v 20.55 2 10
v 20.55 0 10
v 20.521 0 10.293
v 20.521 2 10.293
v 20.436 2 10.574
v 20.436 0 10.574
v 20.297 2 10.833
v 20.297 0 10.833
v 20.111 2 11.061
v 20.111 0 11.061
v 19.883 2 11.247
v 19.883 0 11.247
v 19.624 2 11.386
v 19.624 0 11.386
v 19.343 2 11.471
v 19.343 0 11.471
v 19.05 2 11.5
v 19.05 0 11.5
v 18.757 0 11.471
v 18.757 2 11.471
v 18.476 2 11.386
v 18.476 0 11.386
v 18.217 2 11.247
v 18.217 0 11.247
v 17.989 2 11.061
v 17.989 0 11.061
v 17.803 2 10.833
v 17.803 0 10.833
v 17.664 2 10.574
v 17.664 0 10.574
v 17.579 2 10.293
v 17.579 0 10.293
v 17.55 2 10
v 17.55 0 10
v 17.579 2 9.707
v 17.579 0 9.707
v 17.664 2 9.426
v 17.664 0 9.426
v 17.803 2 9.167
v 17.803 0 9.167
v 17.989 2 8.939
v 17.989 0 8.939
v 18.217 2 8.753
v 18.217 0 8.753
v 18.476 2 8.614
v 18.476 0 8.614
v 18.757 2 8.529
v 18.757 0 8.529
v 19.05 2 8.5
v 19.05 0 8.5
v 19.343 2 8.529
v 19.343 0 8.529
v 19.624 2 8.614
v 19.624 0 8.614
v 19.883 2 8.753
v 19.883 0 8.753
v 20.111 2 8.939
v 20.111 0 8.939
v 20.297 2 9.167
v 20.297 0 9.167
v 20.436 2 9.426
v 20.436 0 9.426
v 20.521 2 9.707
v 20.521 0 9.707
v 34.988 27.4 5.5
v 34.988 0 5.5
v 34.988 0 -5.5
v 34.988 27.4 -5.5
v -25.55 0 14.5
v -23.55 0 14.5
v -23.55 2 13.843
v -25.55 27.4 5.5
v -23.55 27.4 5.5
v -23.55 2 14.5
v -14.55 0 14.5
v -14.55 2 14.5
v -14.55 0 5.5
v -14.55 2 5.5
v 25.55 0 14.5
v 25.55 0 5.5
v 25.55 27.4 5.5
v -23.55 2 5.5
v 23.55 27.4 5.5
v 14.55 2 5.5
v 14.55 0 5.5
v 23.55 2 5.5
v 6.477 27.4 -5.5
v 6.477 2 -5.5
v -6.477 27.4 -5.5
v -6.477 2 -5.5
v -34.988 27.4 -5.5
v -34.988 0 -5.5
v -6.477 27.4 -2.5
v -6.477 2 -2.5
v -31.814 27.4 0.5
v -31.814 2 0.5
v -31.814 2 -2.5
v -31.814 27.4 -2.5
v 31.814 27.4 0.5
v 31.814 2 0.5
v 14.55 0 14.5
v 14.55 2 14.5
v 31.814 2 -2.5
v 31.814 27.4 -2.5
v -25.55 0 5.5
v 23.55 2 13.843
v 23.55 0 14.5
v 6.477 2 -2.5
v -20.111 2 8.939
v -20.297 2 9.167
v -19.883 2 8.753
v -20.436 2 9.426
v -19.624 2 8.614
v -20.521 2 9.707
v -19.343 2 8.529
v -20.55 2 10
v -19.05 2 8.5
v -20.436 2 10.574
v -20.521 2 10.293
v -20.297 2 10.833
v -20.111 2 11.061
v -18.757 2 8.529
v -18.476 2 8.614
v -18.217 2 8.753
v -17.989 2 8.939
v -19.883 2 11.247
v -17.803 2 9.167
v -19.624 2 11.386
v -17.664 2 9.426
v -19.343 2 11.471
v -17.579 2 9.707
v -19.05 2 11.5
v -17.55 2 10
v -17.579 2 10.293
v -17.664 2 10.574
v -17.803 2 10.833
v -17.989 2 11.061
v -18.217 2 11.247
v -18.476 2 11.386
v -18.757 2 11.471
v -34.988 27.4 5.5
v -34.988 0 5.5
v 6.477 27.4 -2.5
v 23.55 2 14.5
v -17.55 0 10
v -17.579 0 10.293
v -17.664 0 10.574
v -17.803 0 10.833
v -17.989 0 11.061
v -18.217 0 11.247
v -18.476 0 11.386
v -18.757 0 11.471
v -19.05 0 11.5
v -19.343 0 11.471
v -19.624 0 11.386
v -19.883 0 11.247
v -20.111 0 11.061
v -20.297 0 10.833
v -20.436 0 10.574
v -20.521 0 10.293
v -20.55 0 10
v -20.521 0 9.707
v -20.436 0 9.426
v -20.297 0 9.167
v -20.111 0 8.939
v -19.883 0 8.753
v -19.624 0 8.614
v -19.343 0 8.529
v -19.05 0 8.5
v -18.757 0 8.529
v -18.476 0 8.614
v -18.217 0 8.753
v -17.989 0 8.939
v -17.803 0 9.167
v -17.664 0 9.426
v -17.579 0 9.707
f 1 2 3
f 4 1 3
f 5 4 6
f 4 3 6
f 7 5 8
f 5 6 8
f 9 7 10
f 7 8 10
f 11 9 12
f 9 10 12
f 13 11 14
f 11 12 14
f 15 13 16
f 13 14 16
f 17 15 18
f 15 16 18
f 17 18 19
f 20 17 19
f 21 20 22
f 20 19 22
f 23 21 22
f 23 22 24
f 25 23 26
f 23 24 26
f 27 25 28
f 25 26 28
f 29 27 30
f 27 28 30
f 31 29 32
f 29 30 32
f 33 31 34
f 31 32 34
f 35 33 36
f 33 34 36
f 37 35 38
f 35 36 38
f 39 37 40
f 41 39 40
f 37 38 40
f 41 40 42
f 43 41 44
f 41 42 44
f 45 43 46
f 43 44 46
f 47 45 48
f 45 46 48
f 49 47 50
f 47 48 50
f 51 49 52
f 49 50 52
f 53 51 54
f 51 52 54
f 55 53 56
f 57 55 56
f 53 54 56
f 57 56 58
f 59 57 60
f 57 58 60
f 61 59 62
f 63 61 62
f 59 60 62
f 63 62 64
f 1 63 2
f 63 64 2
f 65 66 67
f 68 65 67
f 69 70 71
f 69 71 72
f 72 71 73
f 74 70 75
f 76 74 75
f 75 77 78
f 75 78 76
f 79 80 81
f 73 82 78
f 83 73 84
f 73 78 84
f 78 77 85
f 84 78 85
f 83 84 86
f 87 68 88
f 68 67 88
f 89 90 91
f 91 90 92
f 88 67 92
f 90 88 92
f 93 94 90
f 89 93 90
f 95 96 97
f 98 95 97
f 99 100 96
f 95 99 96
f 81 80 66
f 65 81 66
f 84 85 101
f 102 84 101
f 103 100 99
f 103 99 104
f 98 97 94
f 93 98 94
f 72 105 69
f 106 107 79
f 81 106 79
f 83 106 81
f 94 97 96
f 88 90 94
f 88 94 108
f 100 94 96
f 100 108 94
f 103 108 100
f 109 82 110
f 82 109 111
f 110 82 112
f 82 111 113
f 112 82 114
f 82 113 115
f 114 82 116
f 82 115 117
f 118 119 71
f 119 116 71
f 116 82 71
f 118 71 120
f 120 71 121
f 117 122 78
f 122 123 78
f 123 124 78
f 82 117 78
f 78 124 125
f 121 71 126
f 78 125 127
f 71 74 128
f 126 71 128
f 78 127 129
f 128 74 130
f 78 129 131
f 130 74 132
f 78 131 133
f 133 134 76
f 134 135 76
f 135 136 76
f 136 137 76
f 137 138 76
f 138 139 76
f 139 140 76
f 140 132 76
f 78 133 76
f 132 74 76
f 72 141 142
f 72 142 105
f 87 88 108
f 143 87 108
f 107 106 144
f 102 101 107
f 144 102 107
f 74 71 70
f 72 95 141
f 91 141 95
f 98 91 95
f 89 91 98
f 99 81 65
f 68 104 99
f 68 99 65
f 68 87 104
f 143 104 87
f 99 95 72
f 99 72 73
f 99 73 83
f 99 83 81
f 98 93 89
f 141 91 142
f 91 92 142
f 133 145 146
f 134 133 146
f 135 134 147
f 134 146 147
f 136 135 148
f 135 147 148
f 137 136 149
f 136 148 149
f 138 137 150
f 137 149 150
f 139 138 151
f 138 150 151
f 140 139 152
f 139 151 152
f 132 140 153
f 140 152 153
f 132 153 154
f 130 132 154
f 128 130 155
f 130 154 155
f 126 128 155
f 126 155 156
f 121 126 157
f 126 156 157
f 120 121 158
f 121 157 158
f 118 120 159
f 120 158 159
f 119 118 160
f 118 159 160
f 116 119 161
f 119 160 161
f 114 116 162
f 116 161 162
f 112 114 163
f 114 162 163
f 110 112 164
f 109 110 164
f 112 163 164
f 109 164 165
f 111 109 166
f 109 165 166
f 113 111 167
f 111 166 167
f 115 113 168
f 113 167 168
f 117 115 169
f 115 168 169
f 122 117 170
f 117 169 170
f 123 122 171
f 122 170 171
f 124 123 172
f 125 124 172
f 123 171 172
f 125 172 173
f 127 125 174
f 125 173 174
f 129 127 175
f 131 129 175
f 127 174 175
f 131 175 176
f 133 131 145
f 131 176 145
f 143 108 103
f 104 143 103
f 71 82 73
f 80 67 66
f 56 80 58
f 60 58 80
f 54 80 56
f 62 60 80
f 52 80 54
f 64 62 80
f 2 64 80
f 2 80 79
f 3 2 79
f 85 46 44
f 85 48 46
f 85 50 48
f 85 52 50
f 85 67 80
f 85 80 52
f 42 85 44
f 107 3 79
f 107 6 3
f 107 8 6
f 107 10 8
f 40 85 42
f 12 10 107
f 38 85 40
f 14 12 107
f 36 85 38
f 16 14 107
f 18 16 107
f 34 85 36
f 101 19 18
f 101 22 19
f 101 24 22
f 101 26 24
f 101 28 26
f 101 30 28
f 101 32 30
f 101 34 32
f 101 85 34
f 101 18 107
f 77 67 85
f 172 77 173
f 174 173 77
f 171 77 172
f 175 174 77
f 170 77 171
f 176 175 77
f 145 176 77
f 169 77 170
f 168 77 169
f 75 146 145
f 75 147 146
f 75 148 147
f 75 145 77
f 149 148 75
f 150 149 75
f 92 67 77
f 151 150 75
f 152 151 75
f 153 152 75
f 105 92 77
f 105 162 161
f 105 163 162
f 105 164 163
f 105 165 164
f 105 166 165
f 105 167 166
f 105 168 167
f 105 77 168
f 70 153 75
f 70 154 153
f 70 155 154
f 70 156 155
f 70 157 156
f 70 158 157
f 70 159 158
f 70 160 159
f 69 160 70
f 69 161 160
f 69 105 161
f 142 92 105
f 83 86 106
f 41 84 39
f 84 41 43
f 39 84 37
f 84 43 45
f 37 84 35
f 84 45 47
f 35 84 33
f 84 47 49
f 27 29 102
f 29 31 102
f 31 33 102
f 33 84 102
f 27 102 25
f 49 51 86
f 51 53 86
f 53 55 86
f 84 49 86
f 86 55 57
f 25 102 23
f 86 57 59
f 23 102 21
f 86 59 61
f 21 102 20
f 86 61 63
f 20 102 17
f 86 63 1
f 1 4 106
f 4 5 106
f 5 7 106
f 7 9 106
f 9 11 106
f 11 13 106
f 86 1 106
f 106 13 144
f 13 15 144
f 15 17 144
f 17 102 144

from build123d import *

# Parameters (mm, degrees)
SKETCH1_W           = 69.977
SKETCH1_H           = 11
BOSS_EXTRUDE1_DEPTH = 2
BOSS_EXTRUDE2_START = 2
SKETCH1_4_W         = 3.175
SKETCH1_4_H         = 3
BOSS_EXTRUDE2_DEPTH = 25.4
SKETCH3_W           = 9
SKETCH3_H           = 9
SKETCH3_R           = 1.5
BOSS_EXTRUDE3_DEPTH = 2
BOSS_EXTRUDE4_DEPTH = 2
BOSS_EXTRUDE5_START = -47.1
BOSS_EXTRUDE5_DEPTH = 2


with BuildPart() as part:
    # Sketch1 → Boss-Extrude1 (new body)
    with BuildSketch(Plane(origin=(0, 0, 0), x_dir=(1, 0, 0), z_dir=(0, 1, 0))):
        Rectangle(SKETCH1_W, SKETCH1_H)
    extrude(amount=BOSS_EXTRUDE1_DEPTH)

    # Sketch1<4> → Boss-Extrude2 (add)
    with BuildSketch(Plane(origin=(0, 0, 0), x_dir=(1, 0, 0), z_dir=(0, 1, 0)).offset(BOSS_EXTRUDE2_START)):
        Polygon((34.9885, -5.5), (34.9885, -0.5), (31.8135, -0.5), (-31.8135, -0.5), (-34.9885, -0.5), (-34.9885, -5.5), align=None)
        Polygon((-6.477, 2.5), (-6.477, 5.5), (-34.9885, 5.5), (-34.9885, 2.5), (-31.8135, 2.5), align=None)
        Polygon((34.9885, 2.5), (34.9885, 5.5), (6.477, 5.5), (6.477, 2.5), (31.8135, 2.5), align=None)
        with Locations((-33.401, 1)):
            Rectangle(SKETCH1_4_W, SKETCH1_4_H)
        with Locations((33.401, 1)):
            Rectangle(SKETCH1_4_W, SKETCH1_4_H)
    extrude(amount=BOSS_EXTRUDE2_DEPTH)

    # Sketch3 → Boss-Extrude3 (add)
    with BuildSketch(Plane.XZ):
        with Locations((-19.05, 10)):
            Rectangle(SKETCH3_W, SKETCH3_H)
        with Locations((-19.05, 10)):
            Circle(SKETCH3_R, mode=Mode.SUBTRACT)
        with Locations((19.05, 10)):
            Rectangle(SKETCH3_W, SKETCH3_H)
        with Locations((19.05, 10)):
            Circle(SKETCH3_R, mode=Mode.SUBTRACT)
    extrude(amount=-BOSS_EXTRUDE3_DEPTH)

    # Sketch4 → Boss-Extrude4 (add)
    with BuildSketch(Plane.ZY.offset(23.55)):
        Polygon((14.5, 0), (5.5, 27.4), (5.5, 0), align=None)
    extrude(amount=BOSS_EXTRUDE4_DEPTH)

    # Sketch4<2> → Boss-Extrude5 (add)
    with BuildSketch(Plane.ZY.offset(23.55).offset(BOSS_EXTRUDE5_START)):
        Polygon((14.5, 0), (5.5, 27.4), (5.5, 0), align=None)
    extrude(amount=-BOSS_EXTRUDE5_DEPTH)


solid = part.part
